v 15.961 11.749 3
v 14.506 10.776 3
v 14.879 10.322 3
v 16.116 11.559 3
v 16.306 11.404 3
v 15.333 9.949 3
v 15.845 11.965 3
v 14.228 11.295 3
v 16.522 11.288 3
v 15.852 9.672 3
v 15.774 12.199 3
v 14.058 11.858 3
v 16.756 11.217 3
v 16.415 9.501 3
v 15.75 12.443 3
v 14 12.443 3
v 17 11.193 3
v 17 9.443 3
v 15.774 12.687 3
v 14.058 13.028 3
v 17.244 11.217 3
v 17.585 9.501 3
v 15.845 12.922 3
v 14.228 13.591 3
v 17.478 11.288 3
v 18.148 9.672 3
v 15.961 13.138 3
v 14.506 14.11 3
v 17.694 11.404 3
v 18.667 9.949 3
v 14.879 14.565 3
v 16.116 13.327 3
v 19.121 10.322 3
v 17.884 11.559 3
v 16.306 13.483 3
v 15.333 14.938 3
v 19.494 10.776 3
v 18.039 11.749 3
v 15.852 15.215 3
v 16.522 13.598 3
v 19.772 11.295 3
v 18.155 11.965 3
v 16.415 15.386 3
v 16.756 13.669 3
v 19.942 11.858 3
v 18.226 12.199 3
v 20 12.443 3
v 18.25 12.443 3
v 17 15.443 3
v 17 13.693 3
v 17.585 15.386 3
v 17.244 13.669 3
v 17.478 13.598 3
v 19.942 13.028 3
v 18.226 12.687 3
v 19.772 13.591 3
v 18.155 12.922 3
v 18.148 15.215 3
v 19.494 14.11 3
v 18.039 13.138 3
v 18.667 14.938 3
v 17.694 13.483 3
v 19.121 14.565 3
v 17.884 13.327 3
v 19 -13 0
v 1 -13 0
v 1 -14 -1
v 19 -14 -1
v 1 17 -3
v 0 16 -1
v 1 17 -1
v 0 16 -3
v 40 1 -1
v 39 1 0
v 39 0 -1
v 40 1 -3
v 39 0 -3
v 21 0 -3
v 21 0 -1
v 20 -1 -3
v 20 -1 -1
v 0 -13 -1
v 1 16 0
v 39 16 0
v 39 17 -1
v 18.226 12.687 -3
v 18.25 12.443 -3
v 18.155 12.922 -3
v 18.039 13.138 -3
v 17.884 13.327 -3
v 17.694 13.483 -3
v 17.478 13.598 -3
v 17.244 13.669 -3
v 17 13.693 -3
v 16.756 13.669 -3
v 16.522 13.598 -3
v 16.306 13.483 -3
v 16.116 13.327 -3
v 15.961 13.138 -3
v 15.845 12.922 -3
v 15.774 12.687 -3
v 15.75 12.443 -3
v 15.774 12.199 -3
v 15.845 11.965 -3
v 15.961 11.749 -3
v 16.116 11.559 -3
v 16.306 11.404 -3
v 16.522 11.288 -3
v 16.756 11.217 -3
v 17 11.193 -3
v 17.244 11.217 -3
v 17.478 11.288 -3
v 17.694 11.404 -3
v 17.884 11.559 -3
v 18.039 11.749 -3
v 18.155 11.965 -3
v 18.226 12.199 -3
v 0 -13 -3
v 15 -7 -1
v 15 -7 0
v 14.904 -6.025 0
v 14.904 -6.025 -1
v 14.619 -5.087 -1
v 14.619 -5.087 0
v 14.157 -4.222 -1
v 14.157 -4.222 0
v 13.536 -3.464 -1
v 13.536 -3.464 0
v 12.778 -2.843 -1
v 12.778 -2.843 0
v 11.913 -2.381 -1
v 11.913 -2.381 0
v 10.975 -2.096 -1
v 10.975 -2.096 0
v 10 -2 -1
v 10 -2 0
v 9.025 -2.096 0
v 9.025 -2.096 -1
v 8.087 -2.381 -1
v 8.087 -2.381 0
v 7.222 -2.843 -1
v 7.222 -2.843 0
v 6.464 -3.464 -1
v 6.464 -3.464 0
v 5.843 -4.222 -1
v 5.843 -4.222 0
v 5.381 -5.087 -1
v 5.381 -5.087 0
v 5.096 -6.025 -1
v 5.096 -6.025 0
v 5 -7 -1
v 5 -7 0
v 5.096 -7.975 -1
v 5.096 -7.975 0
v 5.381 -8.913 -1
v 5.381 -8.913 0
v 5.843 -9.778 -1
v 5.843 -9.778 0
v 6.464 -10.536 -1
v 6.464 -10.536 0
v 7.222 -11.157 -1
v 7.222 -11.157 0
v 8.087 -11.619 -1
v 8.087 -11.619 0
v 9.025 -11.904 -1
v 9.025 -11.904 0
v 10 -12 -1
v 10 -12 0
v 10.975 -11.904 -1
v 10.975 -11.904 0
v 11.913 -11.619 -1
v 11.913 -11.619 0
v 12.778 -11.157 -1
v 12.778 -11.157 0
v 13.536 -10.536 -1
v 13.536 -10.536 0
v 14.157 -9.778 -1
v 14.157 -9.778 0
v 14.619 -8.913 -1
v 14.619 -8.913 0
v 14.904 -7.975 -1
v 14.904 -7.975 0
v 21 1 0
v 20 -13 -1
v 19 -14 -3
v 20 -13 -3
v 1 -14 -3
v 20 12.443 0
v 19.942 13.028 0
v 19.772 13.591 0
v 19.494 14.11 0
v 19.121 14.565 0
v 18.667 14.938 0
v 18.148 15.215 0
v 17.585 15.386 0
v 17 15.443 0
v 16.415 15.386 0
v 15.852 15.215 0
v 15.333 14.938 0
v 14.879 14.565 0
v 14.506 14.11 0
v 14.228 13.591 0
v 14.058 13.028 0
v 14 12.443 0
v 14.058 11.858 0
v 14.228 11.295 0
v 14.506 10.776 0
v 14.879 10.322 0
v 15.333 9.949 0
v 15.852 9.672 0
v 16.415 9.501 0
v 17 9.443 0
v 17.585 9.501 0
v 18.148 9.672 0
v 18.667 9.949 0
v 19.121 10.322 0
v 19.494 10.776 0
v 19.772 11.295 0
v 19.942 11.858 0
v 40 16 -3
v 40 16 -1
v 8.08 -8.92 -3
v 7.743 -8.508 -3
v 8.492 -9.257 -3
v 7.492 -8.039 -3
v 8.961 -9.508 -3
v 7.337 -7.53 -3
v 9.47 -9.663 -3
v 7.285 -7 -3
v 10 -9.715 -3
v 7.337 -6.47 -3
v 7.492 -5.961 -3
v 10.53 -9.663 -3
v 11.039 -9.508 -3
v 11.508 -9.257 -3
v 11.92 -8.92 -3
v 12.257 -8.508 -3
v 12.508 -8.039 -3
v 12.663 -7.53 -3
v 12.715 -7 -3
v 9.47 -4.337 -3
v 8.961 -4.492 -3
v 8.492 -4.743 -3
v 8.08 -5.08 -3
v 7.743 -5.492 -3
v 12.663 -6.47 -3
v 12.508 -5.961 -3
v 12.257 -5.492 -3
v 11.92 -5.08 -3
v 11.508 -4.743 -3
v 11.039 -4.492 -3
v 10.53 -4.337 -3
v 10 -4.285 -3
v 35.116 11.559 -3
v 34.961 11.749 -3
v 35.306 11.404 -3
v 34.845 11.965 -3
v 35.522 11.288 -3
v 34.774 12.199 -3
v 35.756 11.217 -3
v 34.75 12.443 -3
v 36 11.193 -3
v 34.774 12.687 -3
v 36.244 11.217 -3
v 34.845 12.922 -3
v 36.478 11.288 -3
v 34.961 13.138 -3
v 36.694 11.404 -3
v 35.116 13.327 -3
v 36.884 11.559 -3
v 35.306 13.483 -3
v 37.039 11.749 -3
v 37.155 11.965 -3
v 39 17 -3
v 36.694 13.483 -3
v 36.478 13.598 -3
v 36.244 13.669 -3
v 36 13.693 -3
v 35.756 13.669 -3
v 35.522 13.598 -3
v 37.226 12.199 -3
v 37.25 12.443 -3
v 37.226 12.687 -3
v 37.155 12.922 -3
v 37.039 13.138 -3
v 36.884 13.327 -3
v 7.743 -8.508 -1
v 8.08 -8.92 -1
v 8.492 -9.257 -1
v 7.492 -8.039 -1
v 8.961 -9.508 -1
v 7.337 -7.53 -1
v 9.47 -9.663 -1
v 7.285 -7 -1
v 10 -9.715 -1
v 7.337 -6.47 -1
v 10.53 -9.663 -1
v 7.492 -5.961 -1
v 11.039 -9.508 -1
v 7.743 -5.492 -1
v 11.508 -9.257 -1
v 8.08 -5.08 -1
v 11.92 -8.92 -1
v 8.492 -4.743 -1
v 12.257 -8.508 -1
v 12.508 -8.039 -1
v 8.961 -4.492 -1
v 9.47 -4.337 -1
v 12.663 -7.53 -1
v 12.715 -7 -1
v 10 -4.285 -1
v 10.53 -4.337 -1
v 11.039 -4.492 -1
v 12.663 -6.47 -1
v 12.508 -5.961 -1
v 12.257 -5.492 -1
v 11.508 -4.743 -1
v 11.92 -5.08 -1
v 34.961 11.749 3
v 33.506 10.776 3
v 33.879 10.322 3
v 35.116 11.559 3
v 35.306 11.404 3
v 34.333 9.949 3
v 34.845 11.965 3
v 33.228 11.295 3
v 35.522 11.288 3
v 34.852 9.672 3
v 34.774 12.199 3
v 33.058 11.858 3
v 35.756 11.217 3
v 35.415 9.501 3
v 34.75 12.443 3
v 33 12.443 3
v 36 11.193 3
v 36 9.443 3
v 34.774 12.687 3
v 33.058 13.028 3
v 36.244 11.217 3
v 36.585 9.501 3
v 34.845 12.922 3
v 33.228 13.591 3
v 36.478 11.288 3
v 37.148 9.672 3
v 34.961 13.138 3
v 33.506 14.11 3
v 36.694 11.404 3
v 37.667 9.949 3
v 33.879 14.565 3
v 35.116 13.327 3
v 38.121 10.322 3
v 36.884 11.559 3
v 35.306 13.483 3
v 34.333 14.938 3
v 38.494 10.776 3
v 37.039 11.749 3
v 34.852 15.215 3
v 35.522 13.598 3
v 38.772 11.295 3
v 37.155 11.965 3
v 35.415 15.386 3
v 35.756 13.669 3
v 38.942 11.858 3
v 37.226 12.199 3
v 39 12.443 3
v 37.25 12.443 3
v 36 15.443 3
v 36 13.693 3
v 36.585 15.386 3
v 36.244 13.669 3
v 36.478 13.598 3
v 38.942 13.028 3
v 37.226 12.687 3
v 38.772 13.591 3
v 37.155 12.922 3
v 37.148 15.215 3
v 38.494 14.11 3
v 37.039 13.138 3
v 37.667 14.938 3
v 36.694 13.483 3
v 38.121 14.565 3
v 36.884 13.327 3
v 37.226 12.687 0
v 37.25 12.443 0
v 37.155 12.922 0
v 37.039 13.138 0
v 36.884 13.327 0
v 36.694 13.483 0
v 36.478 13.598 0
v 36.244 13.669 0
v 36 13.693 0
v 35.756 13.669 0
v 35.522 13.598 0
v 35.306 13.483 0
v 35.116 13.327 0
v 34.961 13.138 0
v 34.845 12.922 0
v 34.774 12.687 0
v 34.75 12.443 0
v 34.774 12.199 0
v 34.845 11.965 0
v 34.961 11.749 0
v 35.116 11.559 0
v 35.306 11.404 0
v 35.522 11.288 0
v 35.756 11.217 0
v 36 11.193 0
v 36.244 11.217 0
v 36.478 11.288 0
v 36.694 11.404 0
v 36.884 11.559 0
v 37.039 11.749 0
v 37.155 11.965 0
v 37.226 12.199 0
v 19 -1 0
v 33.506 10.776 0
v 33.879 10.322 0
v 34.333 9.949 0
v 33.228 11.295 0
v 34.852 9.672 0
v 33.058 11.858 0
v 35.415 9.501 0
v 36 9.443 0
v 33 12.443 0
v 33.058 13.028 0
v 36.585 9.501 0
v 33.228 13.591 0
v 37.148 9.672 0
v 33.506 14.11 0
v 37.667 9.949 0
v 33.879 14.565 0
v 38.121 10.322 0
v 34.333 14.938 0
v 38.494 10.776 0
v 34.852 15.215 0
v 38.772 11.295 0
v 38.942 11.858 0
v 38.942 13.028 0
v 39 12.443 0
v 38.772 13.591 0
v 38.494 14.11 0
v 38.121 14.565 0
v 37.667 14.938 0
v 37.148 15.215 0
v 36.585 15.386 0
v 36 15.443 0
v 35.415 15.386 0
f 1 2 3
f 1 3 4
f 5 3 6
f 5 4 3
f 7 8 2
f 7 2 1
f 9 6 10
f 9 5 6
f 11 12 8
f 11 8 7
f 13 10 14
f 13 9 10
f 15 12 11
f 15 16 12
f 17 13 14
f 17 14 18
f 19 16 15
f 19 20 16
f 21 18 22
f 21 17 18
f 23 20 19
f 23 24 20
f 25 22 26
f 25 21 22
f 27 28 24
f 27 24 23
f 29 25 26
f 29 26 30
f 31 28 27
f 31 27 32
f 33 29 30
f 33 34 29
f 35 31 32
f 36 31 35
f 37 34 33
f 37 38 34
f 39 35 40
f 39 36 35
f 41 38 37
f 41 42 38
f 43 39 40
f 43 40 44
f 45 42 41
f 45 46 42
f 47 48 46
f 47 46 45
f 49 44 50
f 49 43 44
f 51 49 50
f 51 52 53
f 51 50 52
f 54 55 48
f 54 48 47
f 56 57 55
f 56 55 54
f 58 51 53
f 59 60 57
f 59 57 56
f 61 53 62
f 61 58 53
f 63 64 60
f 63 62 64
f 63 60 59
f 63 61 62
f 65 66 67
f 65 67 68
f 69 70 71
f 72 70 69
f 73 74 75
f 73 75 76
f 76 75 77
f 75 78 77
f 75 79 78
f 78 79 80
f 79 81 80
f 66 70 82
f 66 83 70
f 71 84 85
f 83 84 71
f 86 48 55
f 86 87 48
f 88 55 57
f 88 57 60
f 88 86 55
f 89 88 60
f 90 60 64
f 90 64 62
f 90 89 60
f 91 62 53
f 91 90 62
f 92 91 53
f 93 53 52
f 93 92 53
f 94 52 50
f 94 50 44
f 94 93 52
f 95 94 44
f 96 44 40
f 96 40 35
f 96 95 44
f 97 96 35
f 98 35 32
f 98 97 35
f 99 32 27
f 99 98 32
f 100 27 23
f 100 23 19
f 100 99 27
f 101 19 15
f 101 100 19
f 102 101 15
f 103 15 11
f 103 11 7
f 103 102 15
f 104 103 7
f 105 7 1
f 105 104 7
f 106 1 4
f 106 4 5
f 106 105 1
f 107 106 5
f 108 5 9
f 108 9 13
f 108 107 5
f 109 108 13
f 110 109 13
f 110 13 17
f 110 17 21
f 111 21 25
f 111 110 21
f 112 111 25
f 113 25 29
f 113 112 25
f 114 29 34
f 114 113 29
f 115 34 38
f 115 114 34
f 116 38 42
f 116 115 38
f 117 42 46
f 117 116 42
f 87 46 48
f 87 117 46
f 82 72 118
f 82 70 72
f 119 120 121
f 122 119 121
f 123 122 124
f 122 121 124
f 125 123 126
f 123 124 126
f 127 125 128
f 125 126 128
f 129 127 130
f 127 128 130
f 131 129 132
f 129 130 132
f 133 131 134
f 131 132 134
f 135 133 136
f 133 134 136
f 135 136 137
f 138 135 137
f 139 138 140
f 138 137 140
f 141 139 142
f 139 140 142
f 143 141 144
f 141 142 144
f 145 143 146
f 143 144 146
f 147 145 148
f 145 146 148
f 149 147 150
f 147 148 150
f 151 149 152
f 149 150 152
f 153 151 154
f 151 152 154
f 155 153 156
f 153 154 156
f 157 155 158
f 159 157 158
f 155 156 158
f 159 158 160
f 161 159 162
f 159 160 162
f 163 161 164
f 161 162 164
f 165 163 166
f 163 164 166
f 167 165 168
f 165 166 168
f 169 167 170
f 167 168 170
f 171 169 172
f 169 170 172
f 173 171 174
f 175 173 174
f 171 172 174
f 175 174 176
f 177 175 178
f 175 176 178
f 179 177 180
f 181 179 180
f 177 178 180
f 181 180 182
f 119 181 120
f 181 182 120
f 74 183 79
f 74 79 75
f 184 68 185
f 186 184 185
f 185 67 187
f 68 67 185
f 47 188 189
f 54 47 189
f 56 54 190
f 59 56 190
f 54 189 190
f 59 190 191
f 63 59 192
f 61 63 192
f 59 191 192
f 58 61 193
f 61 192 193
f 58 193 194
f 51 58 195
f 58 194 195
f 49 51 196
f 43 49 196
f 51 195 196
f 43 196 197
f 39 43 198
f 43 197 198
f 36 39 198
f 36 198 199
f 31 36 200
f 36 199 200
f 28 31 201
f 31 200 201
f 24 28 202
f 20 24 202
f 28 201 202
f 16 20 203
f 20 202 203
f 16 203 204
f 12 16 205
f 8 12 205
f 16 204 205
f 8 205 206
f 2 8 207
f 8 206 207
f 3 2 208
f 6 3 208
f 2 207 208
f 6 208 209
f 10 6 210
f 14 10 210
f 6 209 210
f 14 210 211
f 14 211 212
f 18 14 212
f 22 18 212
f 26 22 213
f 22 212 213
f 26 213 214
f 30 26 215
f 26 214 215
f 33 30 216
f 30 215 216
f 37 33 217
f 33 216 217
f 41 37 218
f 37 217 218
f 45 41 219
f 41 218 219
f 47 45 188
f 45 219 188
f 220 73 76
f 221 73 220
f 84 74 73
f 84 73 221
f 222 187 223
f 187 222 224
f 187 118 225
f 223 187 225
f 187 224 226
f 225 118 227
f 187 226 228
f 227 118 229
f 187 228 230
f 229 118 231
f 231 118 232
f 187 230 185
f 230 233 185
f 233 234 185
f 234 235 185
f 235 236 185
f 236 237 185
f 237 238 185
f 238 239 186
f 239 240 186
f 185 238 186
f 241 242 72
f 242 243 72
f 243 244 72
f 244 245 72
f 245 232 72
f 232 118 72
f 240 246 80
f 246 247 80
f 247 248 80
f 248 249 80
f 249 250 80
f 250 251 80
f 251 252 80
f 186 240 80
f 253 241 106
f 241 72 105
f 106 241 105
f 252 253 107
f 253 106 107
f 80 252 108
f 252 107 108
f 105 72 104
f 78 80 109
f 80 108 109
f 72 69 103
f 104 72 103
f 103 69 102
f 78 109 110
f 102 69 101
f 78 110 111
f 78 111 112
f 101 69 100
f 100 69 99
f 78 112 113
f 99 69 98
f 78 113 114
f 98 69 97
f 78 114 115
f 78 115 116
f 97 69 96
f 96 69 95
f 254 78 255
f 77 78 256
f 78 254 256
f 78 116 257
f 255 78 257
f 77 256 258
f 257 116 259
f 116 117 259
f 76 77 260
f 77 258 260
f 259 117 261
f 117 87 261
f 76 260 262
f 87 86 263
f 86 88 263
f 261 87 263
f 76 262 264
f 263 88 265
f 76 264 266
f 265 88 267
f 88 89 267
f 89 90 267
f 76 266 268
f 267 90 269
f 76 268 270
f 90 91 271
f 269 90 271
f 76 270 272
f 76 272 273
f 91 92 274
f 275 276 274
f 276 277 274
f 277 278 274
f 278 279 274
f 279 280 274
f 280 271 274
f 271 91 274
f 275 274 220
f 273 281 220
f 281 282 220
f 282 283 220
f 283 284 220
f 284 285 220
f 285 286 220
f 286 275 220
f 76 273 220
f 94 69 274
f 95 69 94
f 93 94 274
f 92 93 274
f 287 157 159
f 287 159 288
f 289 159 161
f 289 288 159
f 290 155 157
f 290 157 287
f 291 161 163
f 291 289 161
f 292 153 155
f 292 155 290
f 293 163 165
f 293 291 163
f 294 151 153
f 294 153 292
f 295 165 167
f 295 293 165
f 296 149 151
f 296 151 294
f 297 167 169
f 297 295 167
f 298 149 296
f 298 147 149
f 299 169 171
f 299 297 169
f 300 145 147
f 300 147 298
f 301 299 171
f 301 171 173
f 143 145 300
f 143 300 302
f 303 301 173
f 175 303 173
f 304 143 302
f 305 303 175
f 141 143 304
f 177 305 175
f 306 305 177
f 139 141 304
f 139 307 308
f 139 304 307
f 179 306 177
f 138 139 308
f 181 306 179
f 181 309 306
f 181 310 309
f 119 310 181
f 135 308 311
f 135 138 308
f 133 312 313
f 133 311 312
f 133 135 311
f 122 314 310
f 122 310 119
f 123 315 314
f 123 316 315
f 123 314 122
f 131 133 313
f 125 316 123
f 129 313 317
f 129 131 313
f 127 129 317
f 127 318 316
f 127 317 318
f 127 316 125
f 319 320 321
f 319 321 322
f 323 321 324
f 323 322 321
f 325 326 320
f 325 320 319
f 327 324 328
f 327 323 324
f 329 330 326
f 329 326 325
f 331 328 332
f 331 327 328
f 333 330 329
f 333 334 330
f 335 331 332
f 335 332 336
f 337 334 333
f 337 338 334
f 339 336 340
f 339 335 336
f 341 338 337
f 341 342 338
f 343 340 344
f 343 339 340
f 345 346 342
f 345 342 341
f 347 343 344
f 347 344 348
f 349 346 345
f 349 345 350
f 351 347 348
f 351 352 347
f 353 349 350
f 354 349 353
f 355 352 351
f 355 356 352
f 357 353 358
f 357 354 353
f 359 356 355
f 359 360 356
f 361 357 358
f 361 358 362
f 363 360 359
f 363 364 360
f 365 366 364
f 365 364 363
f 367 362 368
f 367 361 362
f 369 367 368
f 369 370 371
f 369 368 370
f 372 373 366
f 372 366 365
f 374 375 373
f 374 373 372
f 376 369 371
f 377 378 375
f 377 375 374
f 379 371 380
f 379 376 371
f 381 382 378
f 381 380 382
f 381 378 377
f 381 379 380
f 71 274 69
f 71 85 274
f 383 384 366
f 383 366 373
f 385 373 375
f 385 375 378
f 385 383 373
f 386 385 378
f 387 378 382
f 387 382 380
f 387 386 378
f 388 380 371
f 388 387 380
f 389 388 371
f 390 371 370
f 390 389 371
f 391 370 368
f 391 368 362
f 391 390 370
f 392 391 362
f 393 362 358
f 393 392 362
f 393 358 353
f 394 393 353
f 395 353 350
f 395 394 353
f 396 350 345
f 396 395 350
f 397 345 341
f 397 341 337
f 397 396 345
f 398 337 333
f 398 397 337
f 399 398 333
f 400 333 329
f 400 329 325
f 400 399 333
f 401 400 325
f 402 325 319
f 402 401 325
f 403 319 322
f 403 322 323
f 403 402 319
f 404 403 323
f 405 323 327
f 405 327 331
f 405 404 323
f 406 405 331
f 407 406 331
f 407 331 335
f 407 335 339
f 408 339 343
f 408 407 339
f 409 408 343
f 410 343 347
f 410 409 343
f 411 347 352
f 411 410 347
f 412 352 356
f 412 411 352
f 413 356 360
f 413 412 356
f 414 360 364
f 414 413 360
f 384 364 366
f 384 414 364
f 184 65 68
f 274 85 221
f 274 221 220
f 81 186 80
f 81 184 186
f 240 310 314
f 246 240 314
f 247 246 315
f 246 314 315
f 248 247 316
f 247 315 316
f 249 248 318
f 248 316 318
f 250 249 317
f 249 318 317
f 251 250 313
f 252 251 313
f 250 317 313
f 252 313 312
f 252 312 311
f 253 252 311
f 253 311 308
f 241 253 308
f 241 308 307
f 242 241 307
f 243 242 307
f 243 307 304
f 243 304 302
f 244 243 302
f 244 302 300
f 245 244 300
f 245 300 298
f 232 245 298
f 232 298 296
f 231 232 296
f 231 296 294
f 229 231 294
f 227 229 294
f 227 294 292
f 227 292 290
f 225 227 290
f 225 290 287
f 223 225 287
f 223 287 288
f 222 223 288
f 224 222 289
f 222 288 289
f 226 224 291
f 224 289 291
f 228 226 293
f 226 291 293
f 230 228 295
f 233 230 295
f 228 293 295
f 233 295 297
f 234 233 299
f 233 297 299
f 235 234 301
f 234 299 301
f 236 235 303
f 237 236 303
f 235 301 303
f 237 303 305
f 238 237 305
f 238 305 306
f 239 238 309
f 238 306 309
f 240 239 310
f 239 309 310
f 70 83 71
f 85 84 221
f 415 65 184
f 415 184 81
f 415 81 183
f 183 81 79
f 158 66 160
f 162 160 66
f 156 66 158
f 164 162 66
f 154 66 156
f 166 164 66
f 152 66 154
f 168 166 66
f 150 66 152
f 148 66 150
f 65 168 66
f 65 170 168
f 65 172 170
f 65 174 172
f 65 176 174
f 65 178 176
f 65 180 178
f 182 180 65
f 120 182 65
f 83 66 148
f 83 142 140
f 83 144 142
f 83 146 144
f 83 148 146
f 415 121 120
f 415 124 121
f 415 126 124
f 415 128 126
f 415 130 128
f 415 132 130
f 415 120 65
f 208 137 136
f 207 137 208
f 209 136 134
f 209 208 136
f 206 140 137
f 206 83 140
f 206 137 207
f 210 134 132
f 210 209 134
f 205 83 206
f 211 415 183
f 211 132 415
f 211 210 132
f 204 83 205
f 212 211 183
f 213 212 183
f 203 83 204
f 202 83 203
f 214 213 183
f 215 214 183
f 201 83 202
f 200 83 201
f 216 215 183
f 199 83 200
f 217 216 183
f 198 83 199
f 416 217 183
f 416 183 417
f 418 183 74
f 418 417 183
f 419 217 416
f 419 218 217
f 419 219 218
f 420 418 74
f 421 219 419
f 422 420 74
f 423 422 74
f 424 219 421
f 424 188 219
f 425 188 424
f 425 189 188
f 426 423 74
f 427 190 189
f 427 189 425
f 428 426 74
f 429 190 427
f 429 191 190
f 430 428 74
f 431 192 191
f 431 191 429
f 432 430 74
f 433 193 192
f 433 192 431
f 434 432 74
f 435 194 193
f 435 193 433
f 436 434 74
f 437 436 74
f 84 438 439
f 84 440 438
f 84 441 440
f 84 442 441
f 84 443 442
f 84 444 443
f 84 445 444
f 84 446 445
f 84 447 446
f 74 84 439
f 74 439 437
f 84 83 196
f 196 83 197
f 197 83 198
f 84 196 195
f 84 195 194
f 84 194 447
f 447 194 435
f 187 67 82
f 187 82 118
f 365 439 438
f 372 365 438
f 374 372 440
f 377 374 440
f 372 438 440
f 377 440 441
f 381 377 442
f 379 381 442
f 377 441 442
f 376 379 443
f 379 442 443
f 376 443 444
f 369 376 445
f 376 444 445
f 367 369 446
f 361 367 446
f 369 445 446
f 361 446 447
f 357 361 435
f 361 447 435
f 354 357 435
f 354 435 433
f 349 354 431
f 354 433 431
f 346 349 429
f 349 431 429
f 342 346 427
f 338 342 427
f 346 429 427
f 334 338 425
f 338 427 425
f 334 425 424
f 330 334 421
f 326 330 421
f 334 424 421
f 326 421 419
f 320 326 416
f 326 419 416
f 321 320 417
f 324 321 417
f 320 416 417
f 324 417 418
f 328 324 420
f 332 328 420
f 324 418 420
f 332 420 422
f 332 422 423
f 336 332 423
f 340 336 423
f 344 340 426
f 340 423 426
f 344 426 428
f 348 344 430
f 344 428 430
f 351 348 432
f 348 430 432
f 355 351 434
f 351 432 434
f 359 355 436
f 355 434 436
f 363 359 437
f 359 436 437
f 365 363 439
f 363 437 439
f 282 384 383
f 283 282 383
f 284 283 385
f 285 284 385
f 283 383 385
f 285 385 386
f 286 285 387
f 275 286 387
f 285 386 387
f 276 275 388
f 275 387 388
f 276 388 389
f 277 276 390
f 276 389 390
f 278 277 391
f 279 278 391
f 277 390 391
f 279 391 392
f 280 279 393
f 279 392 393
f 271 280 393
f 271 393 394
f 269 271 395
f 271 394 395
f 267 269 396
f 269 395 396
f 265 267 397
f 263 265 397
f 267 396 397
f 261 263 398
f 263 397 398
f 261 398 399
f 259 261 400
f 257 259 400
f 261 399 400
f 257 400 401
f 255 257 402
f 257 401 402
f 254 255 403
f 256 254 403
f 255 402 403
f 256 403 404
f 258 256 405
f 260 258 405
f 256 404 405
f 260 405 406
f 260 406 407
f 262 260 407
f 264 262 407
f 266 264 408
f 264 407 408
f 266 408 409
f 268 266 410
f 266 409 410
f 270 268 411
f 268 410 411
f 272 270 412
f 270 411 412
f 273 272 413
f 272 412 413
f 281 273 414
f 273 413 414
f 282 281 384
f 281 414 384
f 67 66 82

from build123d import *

# Parameters (mm, degrees)
F0_W     = 20
F0_H     = 14
F0_R     = 2.7148316461
F0_R_2   = 3
F0_R_3   = 1.25
F1_DEPTH = 3
F2_R     = 5
F2_R_2   = 2.7148316461
F3_DEPTH = 1
F4_DEPTH = 3
F5_SIZE  = 0.99999


# Not quite as in the source:
# - a fillet or chamfer is up to 0.001 mm smaller than in the source, because OpenCascade refuses the exact size


with BuildPart() as f1:
    # F0 (on Top) → F1 (new body)
    with BuildSketch(Plane.XY):
        with Locations((10, -7)):
            Rectangle(F0_W, F0_H)
        with Locations((10, -7)):
            Circle(F0_R, mode=Mode.SUBTRACT)
        Polygon((0, 17), (0, 0), (20, 0), (40, 0), (40, 17), align=None)
        with Locations((17, 12.44318299)):
            Circle(F0_R_2, mode=Mode.SUBTRACT)
        with Locations((36, 12.44318299)):
            Circle(F0_R_2, mode=Mode.SUBTRACT)
        with Locations((36, 12.44318299)):
            Circle(F0_R_2)
        with Locations((36, 12.44318299)):
            Circle(F0_R_3, mode=Mode.SUBTRACT)
        with Locations((17, 12.44318299)):
            Circle(F0_R_2)
        with Locations((17, 12.44318299)):
            Circle(F0_R_3, mode=Mode.SUBTRACT)
    extrude(amount=-F1_DEPTH)

    # F2 (on face) → F3 (cut)
    with BuildSketch(Plane.XY):
        with Locations((10, -7)):
            Circle(F2_R)
        with Locations((10, -7)):
            Circle(F2_R_2, mode=Mode.SUBTRACT)
    extrude(amount=-F3_DEPTH, mode=Mode.SUBTRACT)

    # F0 (on Top) → F4 (join)
    with BuildSketch(Plane.XY):
        with Locations((17, 12.44318299)):
            Circle(F0_R_2)
        with Locations((17, 12.44318299)):
            Circle(F0_R_3, mode=Mode.SUBTRACT)
        with Locations((36, 12.44318299)):
            Circle(F0_R_2)
        with Locations((36, 12.44318299)):
            Circle(F0_R_3, mode=Mode.SUBTRACT)
    extrude(amount=F4_DEPTH)

    # F5 (size 1 in the source; OpenCascade refuses exactly that, so slightly less here)
    f5_edges = [f1.edges().sort_by_distance(p)[0] for p in [
        (0, 1.5, 0),
        (10, -14, 0),
        (20, -7, 0),
        (30, 0, 0),
        (40, 8.5, 0),
        (20, 17, 0),
        (40, 0, -1.5),
        (40, 17, -1.5),
        (20, -14, -1.5),
        (0, 17, -1.5),
        (0, -14, -1.5),
        (20, 0, -1.5),
    ]]
    chamfer(f5_edges, length=F5_SIZE)


solid = f1.part
